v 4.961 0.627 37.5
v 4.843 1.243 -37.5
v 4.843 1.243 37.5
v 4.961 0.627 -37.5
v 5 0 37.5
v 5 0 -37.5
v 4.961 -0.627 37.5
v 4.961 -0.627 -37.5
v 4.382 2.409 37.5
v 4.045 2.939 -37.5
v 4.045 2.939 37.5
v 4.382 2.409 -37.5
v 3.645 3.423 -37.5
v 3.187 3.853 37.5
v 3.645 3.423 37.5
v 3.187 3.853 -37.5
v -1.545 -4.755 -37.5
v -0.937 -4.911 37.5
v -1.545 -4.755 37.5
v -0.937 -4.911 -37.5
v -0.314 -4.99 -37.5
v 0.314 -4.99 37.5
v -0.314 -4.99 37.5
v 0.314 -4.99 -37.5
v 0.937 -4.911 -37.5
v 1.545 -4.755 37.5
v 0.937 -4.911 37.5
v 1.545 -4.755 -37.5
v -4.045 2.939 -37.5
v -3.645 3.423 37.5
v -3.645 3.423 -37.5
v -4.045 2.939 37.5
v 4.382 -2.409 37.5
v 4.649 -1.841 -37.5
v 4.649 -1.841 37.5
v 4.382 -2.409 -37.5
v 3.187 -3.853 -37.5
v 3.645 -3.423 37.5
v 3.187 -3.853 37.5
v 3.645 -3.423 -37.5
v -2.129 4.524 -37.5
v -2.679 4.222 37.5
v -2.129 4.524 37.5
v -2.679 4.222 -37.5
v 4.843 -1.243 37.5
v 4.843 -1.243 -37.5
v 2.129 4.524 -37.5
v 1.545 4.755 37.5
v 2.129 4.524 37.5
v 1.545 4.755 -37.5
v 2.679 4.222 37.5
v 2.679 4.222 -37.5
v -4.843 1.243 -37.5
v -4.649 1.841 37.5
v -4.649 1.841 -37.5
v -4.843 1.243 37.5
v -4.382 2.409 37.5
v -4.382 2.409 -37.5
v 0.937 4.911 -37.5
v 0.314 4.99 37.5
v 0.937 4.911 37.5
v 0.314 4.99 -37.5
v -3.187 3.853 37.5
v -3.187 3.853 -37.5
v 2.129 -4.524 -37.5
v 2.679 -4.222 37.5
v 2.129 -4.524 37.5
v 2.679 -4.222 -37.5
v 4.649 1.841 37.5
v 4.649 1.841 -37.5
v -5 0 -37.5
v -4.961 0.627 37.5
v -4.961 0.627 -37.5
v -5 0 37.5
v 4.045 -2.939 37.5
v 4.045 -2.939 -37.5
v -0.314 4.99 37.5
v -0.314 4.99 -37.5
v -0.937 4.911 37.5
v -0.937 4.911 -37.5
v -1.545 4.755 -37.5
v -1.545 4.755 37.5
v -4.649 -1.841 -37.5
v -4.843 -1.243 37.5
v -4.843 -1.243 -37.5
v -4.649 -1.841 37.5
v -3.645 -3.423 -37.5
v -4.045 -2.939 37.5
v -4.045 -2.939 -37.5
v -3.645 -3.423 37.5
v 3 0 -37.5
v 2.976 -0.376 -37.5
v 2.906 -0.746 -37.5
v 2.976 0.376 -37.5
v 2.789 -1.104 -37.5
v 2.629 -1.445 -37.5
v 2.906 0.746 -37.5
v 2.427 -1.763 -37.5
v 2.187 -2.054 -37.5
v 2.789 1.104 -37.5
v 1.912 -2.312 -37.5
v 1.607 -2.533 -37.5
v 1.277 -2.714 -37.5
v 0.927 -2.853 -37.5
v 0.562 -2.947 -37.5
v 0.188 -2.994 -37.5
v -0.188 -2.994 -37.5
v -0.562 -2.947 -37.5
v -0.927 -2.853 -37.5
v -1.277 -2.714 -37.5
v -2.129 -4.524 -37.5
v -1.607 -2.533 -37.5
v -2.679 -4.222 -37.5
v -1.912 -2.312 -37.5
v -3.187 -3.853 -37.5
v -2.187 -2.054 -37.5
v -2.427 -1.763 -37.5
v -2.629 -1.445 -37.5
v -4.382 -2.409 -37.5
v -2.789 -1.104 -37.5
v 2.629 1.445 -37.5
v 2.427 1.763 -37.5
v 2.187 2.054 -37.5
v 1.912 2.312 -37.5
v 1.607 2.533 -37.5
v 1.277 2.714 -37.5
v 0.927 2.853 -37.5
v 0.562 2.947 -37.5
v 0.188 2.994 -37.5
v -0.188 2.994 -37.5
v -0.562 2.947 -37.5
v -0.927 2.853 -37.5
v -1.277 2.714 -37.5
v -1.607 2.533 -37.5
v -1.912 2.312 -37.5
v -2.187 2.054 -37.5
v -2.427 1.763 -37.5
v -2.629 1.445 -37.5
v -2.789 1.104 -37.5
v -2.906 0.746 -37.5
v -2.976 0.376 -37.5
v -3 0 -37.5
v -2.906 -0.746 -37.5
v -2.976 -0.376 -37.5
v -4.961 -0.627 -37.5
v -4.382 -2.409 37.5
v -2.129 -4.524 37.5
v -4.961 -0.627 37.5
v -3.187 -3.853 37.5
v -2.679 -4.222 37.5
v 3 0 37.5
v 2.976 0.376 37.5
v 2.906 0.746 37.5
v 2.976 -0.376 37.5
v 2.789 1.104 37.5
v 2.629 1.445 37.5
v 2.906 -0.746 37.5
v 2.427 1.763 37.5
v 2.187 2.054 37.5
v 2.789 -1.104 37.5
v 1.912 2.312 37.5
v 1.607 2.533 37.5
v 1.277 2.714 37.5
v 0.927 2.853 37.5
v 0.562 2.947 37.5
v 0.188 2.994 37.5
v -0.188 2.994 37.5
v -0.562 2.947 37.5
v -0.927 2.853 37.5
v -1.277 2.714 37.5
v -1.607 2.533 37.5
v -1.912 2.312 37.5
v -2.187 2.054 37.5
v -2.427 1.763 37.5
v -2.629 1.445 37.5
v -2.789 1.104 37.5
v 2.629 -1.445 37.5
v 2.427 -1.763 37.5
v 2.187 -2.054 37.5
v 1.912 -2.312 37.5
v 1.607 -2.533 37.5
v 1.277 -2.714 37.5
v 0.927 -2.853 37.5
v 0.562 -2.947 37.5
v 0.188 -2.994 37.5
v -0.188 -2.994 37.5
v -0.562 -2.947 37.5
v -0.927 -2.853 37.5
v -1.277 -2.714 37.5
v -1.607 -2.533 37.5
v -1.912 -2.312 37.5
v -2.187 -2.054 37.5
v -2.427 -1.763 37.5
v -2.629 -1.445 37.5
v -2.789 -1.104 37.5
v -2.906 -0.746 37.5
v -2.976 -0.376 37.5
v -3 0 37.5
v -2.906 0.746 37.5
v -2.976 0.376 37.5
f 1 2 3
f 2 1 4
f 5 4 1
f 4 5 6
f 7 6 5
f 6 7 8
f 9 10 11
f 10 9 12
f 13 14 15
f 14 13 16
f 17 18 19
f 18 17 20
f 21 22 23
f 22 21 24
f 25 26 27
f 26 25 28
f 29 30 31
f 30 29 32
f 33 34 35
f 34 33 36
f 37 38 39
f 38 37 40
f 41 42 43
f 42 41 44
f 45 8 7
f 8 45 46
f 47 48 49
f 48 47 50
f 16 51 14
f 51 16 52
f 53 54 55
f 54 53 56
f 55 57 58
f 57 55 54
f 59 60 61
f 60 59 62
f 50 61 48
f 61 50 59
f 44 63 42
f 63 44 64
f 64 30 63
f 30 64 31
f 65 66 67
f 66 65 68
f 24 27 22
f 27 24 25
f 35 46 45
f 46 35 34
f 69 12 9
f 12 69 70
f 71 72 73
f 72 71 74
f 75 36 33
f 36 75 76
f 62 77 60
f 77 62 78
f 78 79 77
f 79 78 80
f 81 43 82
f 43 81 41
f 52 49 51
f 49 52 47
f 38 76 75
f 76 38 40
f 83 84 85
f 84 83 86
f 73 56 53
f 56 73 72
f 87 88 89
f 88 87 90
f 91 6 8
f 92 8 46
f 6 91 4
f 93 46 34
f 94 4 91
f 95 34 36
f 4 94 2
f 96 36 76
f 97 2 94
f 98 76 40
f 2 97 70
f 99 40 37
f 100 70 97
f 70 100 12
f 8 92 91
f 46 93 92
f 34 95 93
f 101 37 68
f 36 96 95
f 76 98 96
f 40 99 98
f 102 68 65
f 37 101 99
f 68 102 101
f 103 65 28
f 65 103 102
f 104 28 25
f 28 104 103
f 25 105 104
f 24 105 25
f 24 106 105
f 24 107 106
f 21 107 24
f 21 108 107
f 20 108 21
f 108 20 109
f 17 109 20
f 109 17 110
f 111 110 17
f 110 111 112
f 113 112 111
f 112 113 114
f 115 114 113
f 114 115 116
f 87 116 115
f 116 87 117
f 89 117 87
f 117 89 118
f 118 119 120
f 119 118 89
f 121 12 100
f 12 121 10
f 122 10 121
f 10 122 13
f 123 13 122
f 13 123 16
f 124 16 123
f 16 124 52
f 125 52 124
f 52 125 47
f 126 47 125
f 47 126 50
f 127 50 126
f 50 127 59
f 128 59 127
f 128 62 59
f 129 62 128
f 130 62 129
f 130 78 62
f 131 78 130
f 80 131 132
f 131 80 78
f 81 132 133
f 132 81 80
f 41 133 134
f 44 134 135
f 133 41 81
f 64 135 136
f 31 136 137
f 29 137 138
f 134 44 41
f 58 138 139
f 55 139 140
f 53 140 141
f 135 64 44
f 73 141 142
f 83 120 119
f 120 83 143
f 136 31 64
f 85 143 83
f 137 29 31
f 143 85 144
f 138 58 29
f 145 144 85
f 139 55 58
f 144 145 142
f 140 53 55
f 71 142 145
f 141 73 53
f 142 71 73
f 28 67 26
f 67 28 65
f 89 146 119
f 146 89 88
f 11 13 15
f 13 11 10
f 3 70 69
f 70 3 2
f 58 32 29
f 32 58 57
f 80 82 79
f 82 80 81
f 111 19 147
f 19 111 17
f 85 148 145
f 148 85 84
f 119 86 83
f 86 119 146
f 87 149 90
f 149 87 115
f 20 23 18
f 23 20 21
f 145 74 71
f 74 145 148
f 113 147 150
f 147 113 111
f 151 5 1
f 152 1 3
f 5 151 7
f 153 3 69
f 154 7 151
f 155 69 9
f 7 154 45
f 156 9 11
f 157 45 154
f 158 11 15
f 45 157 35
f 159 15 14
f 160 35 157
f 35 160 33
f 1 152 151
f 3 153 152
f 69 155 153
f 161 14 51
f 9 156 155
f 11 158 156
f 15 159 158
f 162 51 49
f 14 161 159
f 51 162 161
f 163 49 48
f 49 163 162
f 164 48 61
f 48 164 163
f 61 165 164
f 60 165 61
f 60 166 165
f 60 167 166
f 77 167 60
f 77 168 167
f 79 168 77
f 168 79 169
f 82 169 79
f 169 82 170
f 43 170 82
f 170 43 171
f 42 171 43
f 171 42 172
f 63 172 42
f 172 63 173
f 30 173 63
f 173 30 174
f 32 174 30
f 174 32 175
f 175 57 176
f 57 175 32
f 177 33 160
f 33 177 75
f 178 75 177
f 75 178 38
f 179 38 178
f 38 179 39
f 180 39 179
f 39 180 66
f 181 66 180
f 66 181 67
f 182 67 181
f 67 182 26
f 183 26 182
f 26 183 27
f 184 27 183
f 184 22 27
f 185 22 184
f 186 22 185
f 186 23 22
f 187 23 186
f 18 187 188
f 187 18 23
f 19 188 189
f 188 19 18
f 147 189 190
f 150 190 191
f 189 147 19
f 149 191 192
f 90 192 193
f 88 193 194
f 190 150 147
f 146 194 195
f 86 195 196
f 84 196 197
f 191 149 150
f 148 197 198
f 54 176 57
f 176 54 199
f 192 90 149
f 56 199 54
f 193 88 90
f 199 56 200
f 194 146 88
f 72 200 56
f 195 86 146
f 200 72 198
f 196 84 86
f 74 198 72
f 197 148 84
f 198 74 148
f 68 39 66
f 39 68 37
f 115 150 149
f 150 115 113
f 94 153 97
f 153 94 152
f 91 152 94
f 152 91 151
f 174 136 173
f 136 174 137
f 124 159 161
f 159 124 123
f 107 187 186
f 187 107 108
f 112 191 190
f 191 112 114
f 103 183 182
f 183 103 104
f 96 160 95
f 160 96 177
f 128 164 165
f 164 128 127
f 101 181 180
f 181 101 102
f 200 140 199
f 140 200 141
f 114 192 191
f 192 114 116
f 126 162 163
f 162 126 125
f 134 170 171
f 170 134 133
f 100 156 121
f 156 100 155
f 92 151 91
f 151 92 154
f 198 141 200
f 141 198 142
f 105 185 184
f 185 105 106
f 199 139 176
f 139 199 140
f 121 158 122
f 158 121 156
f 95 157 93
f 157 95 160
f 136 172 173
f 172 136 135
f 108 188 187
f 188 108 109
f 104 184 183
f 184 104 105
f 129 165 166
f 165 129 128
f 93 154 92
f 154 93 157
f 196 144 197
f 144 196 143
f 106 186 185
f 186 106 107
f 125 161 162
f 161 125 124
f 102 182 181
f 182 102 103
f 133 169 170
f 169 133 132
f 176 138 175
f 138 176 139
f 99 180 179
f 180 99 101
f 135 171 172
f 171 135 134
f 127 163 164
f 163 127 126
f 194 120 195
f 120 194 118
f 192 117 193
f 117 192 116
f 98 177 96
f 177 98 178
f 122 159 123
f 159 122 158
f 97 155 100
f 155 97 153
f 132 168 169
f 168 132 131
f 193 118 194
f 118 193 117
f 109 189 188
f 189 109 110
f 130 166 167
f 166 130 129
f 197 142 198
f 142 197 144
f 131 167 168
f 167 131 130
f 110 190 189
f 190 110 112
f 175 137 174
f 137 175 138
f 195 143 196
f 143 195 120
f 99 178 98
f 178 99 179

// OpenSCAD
$fn = 50;


difference() {
	union() {
		translate(v = [0, 0, -37.5000000000]) {
			cylinder(h = 75, r = 5.0000000000);
		}
	}
	union() {
		translate(v = [0, 0, -100.0000000000]) {
			cylinder(h = 200, r = 3.0000000000);
		}
	}
}
